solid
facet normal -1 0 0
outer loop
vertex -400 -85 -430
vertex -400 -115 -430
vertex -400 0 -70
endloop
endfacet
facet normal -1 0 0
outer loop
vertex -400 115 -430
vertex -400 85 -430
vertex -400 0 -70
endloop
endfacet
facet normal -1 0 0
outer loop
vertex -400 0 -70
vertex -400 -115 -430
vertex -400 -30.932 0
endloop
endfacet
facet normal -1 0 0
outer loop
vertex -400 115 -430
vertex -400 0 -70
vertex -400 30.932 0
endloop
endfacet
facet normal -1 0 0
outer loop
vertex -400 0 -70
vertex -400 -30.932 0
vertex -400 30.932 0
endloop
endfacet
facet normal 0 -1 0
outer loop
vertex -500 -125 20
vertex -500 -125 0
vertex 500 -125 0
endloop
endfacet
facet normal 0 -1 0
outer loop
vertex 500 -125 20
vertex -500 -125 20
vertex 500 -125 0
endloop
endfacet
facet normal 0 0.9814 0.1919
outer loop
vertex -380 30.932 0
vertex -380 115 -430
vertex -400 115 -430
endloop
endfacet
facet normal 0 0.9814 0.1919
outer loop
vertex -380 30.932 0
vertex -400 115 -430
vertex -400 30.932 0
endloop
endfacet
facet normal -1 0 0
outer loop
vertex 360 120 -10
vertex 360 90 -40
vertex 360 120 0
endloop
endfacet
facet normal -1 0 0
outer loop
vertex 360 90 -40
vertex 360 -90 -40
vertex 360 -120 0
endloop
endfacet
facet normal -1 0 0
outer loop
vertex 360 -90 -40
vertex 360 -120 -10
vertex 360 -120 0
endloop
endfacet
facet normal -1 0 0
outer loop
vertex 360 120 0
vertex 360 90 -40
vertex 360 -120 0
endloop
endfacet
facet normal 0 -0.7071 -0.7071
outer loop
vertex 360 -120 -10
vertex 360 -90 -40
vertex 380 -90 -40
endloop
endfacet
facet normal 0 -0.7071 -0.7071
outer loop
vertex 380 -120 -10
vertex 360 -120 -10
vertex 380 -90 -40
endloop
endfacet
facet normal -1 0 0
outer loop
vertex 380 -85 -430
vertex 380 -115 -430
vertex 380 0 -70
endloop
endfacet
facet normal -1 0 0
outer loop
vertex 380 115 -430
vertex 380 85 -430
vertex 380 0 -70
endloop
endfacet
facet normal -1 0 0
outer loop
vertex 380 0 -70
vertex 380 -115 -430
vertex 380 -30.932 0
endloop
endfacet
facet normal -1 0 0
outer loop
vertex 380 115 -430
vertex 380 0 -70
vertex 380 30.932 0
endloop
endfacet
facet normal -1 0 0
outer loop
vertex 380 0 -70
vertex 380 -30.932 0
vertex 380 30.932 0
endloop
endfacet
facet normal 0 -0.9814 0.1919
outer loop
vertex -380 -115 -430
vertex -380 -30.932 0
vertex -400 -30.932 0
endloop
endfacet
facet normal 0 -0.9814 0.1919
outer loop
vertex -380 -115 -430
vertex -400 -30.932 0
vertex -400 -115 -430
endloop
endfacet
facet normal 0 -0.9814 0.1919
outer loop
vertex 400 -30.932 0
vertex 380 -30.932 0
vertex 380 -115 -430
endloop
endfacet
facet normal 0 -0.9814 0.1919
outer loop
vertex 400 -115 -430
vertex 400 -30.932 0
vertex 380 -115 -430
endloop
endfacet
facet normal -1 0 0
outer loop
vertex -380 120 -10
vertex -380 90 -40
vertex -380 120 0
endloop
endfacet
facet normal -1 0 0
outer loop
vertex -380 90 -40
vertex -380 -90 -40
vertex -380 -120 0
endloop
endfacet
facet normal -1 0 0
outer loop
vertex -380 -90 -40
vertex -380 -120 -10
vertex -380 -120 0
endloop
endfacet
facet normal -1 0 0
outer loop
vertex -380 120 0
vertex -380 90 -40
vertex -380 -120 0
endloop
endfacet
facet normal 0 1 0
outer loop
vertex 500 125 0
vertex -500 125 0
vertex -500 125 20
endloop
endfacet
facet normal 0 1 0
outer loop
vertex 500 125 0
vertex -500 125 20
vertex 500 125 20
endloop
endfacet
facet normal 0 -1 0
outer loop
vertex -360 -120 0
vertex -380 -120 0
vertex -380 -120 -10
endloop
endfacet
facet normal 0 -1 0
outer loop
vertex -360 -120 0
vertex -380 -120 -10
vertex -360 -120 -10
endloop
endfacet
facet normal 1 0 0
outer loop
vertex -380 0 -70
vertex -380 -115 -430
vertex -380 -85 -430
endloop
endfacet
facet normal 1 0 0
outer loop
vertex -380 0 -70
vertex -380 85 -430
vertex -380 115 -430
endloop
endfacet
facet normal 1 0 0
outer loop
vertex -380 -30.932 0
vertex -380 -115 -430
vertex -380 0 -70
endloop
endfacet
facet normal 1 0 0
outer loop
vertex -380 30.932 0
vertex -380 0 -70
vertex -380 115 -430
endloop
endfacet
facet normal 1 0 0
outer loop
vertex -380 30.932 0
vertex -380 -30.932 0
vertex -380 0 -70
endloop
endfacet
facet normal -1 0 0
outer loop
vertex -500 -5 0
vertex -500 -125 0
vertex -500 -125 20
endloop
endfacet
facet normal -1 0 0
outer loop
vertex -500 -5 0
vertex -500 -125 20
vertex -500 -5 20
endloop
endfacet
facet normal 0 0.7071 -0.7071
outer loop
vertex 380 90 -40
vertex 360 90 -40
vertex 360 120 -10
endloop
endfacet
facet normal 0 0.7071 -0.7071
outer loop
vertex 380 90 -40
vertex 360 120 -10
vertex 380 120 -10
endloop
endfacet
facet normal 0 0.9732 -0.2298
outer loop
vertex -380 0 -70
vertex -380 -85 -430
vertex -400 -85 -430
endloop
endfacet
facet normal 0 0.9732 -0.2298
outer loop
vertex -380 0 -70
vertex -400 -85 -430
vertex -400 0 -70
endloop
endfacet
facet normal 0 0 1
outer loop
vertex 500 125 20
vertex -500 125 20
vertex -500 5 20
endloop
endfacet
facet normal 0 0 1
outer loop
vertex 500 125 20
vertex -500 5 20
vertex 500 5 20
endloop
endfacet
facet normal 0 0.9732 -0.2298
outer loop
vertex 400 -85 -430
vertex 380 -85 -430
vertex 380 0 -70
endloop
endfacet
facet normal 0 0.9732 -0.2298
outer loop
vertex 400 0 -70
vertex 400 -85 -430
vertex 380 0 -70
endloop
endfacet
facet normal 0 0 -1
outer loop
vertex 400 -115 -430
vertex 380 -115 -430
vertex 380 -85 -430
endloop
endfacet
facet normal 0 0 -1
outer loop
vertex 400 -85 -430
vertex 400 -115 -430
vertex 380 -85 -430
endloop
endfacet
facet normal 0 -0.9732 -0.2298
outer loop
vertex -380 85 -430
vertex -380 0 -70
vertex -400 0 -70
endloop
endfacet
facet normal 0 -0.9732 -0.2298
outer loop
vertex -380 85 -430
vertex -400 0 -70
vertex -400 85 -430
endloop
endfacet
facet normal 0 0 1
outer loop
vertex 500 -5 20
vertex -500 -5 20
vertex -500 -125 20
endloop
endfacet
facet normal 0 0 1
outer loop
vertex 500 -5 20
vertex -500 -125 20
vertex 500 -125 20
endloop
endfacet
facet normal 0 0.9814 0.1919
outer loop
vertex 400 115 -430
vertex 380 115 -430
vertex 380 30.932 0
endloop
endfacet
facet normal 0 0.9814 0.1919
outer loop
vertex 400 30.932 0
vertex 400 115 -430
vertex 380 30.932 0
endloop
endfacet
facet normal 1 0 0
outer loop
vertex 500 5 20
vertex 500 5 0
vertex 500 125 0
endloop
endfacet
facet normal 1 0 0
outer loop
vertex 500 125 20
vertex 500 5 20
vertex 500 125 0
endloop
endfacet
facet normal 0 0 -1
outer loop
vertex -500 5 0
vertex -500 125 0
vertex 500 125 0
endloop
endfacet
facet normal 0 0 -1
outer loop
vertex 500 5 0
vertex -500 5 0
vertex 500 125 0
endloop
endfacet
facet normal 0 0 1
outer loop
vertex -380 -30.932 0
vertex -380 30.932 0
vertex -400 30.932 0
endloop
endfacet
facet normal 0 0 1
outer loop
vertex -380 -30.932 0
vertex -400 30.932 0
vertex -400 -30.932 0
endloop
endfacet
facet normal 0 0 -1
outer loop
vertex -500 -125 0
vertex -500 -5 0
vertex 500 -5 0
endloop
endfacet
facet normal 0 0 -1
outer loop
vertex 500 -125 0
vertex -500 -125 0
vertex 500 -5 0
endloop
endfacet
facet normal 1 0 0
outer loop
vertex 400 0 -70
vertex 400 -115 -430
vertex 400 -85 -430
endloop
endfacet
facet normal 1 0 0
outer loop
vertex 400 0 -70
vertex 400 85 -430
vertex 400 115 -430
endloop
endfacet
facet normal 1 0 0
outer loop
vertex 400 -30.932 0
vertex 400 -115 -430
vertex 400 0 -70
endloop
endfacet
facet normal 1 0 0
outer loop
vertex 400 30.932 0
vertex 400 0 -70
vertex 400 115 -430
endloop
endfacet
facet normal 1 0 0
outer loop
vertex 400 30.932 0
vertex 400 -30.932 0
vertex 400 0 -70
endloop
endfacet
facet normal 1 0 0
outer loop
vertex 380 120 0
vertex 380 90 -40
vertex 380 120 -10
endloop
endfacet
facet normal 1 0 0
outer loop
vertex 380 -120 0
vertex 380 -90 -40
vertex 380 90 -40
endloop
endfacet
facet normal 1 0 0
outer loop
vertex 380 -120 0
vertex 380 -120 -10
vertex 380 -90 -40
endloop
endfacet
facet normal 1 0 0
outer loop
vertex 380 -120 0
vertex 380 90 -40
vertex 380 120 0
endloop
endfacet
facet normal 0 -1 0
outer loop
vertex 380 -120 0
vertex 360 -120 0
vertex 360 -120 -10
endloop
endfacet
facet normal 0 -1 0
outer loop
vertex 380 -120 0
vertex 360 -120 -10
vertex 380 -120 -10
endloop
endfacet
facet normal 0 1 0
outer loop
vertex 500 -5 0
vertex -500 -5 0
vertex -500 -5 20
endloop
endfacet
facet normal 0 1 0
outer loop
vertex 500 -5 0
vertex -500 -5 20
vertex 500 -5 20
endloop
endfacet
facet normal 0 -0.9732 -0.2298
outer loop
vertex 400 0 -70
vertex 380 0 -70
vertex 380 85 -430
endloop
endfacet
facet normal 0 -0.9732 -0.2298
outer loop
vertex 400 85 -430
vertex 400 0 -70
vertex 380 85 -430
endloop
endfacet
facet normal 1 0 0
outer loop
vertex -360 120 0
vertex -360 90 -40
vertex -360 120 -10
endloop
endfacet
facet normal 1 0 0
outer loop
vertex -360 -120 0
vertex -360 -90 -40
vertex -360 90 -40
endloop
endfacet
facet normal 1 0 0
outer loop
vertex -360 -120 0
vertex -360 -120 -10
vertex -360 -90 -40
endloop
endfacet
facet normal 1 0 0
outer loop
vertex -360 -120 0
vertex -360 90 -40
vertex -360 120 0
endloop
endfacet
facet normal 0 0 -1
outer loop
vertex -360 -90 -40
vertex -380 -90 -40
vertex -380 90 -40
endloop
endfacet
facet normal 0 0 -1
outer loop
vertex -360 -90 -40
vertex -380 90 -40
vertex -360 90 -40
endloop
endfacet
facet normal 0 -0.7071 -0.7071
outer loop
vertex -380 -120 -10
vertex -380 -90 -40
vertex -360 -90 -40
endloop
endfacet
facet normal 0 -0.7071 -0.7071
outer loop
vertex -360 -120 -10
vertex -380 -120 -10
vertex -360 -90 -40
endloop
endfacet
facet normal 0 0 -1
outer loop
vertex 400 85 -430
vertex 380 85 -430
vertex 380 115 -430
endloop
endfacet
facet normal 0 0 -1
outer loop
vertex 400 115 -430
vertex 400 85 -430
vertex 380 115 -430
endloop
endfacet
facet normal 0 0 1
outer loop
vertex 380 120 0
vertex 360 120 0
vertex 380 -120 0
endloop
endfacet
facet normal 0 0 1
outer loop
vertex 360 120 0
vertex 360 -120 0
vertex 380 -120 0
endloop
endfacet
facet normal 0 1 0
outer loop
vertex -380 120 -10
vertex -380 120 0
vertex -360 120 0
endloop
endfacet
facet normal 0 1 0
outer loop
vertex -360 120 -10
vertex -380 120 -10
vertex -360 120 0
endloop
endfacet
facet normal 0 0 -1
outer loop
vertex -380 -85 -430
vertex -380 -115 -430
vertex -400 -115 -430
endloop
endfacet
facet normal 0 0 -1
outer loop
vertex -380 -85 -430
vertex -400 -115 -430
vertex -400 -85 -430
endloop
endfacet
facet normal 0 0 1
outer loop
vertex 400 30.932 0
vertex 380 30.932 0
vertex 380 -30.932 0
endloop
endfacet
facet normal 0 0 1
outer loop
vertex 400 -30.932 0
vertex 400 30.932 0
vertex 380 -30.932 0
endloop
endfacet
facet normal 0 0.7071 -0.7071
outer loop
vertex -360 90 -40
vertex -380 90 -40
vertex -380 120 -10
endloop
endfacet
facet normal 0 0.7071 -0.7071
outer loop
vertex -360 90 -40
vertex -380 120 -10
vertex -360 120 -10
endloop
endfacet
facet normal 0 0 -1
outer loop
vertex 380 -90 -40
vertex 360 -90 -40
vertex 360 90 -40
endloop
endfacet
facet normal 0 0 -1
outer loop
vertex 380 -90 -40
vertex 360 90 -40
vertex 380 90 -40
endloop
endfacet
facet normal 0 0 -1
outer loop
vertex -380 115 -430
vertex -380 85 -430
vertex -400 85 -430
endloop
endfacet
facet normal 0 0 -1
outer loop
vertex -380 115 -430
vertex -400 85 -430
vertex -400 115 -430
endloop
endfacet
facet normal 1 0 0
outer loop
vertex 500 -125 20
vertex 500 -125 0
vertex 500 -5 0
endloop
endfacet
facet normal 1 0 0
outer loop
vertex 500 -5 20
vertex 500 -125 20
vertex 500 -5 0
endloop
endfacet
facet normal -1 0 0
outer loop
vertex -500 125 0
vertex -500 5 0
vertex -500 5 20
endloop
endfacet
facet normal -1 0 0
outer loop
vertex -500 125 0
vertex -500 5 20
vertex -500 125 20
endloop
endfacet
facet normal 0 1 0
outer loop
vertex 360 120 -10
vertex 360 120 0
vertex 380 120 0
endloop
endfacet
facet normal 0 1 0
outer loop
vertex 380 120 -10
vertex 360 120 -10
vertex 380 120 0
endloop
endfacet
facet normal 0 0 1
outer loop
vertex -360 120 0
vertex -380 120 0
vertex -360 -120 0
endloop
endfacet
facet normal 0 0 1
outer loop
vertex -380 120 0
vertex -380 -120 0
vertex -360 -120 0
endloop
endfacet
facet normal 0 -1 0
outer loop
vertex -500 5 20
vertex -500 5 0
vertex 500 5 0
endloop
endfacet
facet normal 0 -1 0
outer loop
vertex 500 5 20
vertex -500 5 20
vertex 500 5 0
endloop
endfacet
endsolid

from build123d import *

# Parameters (mm, degrees)
F0_W      = 1000
F0_H      = 120
F1_DEPTH  = 20
F2_W      = 20
F2_H      = 40
F3_DEPTH  = 120
F5_START  = 380
F5_DEPTH  = 20
F6_START  = -380
F6_DEPTH  = 20
F7_SIZE   = 30
F7_2_SIZE = 30


with BuildPart() as f1:
    # F0 (on Top) → F1 (new body)
    with BuildSketch(Plane.XY):
        with Locations((0, 65)):
            Rectangle(F0_W, F0_H)
    extrude(amount=F1_DEPTH)


with BuildPart() as f1b:
    # F0 (on Top) → F1, piece 2 (new body)
    with BuildSketch(Plane.XY):
        with Locations((0, -65)):
            Rectangle(F0_W, F0_H)
    extrude(amount=F1_DEPTH)


with BuildPart() as f3:
    # F2 (on Front) → F3 (new body, symmetric)
    with BuildSketch(Plane.XZ):
        with Locations((-370, -20)):
            Rectangle(F2_W, F2_H)
    extrude(amount=F3_DEPTH, both=True)

    # F7
    f7_edges = [f3.edges().sort_by_distance(p)[0] for p in [
        (-370, -120, -40),
        (-370, 120, -40),
    ]]
    chamfer(f7_edges, length=F7_SIZE)


with BuildPart() as f3b:
    # F2 (on Front) → F3, piece 2 (new body, symmetric)
    with BuildSketch(Plane.XZ):
        with Locations((370, -20)):
            Rectangle(F2_W, F2_H)
    extrude(amount=F3_DEPTH, both=True)

    # F7#2
    f7_2_edges = [f3b.edges().sort_by_distance(p)[0] for p in [
        (370, -120, -40),
        (370, 120, -40),
    ]]
    chamfer(f7_2_edges, length=F7_2_SIZE)


with BuildPart() as f5:
    # F4 (on Right) → F5 (new body)
    with BuildSketch(Plane.YZ.offset(F5_START)):
        Polygon((30.9321093395, 0), (0, 0), (0, -70), (85, -430), (115, -430), align=None)
        Polygon((0, -70), (0, 0), (-30.9321093395, 0), (-115, -430), (-85, -430), align=None)
    extrude(amount=F5_DEPTH)


with BuildPart() as f6:
    # F4 (on Right) → F6 (new body)
    with BuildSketch(Plane.YZ.offset(F6_START)):
        Polygon((30.9321093395, 0), (0, 0), (0, -70), (85, -430), (115, -430), align=None)
        Polygon((0, -70), (0, 0), (-30.9321093395, 0), (-115, -430), (-85, -430), align=None)
    extrude(amount=-F6_DEPTH)


solid = Compound([f1.part, f1b.part, f3.part, f3b.part, f5.part, f6.part])
